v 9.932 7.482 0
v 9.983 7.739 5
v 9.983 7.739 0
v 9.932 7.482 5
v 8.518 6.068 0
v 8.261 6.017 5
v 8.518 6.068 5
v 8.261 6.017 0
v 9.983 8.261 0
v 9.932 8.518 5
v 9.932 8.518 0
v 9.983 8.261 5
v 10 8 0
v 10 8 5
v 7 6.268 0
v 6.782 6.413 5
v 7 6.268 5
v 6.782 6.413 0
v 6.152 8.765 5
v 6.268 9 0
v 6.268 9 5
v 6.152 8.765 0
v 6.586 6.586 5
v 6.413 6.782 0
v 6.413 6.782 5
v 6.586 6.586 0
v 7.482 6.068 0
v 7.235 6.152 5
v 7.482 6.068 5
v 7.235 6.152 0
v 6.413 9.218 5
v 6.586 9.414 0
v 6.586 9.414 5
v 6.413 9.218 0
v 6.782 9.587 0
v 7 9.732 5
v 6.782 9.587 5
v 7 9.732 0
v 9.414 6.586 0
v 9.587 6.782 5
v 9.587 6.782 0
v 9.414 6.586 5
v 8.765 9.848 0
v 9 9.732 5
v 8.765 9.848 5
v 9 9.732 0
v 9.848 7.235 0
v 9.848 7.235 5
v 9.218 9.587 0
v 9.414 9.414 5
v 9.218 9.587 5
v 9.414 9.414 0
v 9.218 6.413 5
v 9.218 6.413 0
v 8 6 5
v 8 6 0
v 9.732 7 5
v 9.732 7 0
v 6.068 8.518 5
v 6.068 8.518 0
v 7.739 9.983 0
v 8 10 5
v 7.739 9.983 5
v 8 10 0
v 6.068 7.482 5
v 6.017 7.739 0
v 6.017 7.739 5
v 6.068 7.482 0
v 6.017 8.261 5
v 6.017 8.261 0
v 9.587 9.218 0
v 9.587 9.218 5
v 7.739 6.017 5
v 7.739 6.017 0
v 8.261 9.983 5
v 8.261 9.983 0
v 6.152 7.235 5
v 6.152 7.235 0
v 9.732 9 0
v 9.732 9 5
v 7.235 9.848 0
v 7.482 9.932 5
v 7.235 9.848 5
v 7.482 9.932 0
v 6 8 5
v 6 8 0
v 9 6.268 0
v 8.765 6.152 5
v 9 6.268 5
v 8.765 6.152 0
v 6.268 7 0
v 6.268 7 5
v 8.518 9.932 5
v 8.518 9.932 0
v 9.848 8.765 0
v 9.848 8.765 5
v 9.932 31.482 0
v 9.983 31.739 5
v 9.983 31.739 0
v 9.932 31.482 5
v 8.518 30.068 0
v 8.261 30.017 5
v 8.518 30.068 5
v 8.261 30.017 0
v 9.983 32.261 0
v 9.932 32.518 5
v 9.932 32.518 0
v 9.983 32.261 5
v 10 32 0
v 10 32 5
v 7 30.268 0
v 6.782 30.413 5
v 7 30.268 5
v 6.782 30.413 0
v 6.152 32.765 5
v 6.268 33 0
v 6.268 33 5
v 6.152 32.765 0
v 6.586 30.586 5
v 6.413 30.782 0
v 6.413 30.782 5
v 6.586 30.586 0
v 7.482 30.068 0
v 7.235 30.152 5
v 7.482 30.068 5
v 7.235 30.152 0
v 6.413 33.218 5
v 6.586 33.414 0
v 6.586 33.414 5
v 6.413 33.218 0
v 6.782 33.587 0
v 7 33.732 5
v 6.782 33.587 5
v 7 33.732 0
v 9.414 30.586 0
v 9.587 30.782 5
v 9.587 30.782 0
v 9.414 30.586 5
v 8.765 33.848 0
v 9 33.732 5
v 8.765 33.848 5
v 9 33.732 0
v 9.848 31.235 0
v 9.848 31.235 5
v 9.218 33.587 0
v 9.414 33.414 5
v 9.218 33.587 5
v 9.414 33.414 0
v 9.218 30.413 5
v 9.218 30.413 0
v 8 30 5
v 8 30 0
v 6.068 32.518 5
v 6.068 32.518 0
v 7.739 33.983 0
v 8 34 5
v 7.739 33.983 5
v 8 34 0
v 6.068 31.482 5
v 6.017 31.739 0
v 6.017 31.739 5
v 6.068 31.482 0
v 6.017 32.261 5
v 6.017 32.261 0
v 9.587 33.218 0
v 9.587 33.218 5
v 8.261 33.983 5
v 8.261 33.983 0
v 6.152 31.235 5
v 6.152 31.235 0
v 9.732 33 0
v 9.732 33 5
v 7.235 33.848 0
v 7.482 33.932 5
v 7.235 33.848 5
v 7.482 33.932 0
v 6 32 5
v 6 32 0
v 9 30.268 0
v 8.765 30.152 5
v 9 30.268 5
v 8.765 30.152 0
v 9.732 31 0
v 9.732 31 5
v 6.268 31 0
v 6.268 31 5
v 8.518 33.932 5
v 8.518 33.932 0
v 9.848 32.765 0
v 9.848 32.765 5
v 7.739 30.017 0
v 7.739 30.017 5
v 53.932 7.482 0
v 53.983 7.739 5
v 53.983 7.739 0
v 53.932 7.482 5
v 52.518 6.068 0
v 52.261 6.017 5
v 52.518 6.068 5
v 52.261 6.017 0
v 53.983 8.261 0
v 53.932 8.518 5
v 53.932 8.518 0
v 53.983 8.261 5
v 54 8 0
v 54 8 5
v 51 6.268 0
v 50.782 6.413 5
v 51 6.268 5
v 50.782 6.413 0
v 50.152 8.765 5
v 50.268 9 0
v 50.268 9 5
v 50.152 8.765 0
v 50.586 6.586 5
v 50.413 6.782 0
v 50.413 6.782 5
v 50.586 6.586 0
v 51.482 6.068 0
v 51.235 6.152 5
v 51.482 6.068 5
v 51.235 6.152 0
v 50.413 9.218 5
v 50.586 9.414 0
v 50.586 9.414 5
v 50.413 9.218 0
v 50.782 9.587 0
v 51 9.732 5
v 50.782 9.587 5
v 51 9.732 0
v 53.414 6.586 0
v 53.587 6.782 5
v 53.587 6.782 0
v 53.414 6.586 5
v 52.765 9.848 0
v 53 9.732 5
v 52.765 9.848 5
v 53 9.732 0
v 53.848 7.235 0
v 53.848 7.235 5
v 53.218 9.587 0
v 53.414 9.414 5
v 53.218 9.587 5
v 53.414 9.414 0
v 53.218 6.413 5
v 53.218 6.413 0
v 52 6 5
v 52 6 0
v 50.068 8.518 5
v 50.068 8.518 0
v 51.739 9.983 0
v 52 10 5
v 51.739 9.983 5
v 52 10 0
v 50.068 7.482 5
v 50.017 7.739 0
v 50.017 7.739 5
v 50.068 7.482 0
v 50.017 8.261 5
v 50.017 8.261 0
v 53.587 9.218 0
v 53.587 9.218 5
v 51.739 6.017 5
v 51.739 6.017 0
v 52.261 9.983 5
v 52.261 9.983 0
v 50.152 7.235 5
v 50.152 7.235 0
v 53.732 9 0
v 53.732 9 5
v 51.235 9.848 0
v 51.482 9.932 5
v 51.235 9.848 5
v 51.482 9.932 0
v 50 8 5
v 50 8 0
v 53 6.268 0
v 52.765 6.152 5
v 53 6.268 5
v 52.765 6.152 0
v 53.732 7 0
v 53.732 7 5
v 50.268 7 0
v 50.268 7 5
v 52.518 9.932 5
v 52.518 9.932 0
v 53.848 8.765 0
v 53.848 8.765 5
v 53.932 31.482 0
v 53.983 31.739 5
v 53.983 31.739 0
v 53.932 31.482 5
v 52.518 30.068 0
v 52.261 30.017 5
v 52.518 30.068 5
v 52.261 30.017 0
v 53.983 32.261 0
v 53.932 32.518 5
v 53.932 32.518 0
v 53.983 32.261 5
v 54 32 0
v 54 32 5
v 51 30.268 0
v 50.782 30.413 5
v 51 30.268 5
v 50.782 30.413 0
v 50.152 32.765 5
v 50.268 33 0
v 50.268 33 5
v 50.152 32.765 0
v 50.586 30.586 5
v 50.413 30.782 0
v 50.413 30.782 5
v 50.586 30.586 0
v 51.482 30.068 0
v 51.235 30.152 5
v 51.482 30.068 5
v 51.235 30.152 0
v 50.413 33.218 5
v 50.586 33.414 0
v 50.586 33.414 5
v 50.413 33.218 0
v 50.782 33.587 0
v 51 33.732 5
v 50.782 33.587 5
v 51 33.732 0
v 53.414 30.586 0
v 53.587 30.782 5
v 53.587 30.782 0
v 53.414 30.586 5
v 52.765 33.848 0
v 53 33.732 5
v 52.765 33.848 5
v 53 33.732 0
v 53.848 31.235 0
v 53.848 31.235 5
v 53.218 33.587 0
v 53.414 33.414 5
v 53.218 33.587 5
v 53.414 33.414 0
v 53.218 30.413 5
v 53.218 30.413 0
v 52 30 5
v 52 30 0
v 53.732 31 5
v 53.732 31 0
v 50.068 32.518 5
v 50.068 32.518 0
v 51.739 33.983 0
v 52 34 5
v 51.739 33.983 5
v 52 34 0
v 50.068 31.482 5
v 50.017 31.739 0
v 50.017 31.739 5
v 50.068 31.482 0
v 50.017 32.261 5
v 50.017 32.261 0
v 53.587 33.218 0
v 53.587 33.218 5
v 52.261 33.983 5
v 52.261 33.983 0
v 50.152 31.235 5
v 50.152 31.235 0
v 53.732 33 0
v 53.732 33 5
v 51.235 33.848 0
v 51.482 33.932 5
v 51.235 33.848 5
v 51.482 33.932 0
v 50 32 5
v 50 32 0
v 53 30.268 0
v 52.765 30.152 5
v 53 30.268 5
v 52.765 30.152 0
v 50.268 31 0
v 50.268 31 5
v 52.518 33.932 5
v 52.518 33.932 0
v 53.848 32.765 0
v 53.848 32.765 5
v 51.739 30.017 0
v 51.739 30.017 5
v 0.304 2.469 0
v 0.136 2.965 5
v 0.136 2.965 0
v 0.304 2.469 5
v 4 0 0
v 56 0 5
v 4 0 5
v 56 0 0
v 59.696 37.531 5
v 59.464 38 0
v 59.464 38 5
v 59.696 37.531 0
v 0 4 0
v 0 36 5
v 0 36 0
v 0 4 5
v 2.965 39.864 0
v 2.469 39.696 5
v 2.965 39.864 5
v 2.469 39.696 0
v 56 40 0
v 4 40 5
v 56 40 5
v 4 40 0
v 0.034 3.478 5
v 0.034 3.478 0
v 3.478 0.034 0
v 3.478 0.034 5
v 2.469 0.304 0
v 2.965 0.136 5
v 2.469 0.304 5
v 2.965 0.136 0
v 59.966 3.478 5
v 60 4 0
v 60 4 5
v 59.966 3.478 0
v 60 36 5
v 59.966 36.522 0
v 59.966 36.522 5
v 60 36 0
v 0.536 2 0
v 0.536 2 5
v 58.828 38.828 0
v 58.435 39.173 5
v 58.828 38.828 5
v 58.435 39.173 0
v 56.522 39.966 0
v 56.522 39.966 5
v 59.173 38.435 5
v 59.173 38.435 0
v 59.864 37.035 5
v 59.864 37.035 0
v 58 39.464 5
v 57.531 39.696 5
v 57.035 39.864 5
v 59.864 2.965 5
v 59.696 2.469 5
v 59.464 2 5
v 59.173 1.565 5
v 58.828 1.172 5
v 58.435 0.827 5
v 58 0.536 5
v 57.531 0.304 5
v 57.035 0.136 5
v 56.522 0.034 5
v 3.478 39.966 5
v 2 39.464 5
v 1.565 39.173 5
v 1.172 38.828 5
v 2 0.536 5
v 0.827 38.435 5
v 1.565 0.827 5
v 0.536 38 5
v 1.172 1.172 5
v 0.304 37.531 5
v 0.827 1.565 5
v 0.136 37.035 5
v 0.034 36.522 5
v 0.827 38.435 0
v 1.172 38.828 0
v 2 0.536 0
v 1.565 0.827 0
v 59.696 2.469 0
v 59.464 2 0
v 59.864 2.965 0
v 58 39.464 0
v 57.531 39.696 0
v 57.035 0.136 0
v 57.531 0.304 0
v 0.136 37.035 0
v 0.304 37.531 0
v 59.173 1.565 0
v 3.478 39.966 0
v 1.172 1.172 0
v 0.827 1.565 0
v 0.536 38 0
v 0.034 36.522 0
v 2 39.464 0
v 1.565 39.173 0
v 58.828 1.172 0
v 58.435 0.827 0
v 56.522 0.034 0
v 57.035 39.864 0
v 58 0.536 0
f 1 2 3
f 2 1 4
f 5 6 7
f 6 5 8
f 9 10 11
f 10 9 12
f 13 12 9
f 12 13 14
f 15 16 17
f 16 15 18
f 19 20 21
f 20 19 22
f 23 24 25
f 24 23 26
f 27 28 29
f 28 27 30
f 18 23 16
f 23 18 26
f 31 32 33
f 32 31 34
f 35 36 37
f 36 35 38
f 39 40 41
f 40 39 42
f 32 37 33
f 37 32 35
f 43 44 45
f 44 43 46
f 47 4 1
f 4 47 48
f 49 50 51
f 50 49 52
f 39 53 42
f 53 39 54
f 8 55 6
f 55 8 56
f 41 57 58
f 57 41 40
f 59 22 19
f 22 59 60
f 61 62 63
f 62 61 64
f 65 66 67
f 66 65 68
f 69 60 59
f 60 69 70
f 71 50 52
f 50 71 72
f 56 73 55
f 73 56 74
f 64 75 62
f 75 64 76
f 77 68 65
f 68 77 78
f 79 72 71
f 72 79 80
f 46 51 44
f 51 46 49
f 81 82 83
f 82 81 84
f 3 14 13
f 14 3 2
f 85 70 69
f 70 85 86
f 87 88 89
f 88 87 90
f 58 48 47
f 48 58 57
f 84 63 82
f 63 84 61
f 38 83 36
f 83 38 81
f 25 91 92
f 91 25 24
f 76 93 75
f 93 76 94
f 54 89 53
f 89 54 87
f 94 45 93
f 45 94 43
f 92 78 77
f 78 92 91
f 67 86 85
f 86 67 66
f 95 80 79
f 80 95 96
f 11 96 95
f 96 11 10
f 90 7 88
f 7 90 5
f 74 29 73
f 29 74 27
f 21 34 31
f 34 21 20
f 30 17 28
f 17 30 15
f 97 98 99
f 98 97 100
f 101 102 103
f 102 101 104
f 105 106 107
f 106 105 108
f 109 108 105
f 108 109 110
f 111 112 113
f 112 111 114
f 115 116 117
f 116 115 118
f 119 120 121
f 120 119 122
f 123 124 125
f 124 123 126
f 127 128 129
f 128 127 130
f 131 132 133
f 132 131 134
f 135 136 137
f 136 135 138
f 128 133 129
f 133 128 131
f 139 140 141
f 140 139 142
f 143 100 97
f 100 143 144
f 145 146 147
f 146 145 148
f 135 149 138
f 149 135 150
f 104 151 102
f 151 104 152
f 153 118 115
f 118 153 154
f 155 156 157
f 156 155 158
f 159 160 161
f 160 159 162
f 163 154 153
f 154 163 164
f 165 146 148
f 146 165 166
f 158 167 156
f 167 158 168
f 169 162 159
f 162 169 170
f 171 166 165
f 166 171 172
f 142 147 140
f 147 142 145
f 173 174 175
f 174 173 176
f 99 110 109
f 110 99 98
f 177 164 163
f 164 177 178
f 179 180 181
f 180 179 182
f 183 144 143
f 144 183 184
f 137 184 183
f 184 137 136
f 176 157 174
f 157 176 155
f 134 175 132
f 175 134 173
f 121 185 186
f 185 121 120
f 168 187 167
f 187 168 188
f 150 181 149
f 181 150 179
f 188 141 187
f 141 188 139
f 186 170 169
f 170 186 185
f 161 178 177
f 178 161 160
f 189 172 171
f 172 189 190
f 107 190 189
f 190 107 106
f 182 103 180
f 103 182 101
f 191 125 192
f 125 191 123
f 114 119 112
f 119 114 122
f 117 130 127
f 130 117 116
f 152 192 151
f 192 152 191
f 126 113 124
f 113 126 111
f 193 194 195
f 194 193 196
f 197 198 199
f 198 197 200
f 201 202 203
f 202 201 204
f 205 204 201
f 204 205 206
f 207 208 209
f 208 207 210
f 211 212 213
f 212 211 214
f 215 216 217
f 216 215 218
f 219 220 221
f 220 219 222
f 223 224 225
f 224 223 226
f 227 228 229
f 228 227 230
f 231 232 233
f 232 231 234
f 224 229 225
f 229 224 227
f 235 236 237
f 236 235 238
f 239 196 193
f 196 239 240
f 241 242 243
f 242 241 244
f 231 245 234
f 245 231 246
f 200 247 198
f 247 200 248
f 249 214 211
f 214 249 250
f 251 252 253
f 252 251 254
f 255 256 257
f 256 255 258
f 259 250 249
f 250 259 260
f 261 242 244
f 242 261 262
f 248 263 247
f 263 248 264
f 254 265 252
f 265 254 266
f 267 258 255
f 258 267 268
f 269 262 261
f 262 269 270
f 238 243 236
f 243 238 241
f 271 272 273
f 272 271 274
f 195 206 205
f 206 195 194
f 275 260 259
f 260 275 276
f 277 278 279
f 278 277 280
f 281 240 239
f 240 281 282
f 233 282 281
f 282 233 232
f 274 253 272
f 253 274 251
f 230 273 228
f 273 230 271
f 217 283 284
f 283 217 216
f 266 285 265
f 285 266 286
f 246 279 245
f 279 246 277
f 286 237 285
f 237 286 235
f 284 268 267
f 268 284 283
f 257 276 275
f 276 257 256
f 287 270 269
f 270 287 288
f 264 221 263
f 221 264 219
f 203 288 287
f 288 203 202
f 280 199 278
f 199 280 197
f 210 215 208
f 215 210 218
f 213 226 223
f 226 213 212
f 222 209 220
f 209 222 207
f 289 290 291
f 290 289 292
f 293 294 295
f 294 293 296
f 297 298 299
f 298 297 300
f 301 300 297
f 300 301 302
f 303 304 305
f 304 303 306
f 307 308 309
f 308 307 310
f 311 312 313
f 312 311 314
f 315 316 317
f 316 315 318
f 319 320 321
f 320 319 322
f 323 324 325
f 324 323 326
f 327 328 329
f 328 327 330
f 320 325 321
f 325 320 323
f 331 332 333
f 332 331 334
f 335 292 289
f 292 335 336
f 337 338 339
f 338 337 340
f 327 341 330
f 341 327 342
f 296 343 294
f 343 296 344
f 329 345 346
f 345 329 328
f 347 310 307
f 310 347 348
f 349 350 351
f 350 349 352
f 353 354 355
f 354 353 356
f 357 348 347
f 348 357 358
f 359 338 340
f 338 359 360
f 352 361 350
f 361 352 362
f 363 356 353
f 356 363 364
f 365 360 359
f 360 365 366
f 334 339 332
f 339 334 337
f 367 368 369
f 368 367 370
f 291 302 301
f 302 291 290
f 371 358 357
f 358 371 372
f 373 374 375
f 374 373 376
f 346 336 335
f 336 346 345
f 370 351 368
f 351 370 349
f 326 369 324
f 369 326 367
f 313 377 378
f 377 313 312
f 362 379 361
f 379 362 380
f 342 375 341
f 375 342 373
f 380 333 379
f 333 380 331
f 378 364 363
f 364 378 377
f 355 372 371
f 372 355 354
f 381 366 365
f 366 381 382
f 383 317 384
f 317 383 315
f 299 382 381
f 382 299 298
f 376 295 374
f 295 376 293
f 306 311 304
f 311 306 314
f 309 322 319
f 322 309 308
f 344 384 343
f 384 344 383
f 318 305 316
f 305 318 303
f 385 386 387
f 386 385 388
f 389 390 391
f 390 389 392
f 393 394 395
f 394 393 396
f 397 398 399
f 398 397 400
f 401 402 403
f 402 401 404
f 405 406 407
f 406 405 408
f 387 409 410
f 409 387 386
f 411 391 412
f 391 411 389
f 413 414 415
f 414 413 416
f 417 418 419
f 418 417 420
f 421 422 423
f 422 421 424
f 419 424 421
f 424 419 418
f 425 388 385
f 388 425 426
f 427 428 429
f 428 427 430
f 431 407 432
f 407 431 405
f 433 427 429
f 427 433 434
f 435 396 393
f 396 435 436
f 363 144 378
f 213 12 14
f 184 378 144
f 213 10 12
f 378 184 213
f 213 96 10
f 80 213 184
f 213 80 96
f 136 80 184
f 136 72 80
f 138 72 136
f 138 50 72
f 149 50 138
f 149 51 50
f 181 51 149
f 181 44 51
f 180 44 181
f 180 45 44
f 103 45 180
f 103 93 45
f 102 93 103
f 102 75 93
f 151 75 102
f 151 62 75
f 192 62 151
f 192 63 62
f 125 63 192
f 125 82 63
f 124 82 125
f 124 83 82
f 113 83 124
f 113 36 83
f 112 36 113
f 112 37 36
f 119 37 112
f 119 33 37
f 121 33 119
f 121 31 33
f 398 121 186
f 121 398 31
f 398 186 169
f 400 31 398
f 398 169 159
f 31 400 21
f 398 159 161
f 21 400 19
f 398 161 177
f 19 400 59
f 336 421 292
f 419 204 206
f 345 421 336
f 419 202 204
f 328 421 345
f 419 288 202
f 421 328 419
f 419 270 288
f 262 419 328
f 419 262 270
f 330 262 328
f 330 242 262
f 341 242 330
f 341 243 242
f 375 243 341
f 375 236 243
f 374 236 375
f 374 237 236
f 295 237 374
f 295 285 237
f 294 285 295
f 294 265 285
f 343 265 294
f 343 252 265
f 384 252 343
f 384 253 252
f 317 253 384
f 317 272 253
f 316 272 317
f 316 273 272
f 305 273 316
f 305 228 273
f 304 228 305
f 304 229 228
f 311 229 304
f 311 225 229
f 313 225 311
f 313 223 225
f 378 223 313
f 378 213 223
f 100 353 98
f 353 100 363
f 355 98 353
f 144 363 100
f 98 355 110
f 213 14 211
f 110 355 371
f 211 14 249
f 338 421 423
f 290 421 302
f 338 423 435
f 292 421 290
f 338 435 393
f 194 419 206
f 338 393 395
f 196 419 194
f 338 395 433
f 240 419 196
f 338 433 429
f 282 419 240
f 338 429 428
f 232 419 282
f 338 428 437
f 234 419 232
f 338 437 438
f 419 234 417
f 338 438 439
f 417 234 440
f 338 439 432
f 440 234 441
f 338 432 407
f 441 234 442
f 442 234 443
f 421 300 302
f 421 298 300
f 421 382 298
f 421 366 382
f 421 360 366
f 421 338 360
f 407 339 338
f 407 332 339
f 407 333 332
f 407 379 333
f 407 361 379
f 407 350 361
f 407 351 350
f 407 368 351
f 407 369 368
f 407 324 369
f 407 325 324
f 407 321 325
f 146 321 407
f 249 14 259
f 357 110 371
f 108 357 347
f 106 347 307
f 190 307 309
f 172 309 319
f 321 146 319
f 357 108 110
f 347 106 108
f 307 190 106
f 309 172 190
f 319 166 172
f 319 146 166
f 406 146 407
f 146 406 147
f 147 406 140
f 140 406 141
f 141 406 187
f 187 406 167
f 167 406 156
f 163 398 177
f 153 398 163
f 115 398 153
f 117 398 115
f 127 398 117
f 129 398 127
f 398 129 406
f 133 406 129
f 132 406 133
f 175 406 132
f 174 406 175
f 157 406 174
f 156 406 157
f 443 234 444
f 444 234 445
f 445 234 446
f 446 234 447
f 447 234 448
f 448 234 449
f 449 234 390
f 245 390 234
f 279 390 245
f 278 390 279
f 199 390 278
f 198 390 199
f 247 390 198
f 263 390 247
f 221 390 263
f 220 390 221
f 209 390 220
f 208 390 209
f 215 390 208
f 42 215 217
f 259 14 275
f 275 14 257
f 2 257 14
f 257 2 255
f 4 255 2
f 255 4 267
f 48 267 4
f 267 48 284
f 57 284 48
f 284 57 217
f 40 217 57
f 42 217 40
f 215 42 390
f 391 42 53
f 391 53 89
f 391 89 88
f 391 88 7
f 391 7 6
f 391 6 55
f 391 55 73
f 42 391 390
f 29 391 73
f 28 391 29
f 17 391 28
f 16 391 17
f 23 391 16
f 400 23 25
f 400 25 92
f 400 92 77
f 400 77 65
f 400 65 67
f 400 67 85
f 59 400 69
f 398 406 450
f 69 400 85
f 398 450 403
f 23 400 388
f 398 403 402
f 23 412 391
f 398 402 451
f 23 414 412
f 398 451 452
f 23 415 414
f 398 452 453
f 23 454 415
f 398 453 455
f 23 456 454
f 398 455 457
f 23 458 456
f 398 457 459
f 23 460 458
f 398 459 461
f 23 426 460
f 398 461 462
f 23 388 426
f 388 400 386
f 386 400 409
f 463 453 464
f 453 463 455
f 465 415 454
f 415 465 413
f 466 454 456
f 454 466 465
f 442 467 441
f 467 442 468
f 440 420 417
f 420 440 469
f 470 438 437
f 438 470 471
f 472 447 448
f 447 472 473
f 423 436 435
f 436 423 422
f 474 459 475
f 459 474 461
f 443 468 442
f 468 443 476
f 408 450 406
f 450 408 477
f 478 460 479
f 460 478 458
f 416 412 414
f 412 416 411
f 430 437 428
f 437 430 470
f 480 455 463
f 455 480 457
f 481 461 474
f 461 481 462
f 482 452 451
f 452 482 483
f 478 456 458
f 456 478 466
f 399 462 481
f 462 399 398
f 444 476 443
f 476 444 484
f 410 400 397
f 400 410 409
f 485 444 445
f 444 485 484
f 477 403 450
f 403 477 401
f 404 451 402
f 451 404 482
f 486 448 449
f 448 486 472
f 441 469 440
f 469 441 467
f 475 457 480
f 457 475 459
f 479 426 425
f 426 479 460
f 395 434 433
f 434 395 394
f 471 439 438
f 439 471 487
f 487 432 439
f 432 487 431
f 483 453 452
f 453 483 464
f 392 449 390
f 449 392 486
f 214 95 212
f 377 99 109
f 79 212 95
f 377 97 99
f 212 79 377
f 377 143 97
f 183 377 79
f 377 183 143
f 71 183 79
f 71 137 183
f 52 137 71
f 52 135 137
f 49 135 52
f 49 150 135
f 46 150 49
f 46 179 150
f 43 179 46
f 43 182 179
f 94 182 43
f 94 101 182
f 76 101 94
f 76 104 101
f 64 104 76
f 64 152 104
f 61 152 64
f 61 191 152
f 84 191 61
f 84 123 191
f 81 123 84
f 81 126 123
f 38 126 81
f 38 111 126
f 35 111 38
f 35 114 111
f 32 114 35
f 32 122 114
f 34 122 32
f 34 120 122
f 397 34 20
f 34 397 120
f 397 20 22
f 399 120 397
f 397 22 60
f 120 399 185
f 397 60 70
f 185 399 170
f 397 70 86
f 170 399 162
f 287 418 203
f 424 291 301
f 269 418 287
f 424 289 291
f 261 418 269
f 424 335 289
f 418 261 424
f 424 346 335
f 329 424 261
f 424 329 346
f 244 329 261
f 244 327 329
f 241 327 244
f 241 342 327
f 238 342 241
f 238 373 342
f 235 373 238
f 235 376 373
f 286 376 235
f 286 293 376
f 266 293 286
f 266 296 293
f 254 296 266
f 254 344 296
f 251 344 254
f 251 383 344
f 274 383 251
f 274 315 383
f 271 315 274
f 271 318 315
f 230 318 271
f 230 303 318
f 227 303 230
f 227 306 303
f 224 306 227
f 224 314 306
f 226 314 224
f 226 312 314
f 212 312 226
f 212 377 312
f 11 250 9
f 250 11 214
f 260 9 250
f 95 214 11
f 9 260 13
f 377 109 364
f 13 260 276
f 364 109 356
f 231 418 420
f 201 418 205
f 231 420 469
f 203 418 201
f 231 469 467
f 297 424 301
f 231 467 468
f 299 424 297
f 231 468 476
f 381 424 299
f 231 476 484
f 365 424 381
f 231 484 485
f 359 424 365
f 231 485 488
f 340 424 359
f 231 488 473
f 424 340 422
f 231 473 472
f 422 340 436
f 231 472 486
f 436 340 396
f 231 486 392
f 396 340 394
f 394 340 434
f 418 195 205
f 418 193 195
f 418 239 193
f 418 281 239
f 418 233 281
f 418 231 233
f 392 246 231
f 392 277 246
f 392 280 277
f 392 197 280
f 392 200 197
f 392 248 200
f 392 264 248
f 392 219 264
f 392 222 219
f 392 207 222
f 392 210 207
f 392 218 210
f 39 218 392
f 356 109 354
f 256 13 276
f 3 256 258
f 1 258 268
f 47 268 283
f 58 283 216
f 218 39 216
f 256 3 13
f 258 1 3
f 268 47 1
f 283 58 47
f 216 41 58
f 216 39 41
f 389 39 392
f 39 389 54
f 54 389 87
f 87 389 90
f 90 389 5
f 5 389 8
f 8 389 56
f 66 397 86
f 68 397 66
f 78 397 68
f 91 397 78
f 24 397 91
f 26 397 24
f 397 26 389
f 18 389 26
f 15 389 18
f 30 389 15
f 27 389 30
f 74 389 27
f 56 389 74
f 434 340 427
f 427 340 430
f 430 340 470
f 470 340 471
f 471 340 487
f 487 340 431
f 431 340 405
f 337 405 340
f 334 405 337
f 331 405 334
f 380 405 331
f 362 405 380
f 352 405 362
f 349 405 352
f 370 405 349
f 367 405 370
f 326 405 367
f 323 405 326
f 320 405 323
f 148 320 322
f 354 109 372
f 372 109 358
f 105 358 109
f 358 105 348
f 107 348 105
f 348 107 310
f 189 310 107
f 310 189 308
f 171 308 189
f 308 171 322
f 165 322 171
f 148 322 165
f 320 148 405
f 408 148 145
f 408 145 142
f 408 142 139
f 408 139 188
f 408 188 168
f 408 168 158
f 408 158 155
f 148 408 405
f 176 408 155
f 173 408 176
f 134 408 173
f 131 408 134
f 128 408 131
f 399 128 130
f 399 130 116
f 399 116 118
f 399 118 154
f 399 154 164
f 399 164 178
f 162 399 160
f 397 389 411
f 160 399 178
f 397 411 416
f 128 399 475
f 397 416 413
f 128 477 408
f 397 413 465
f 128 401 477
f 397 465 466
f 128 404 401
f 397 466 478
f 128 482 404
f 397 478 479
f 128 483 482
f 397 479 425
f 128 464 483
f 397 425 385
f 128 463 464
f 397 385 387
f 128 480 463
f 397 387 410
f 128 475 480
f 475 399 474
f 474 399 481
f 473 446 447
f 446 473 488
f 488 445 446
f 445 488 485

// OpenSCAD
// Uchwyt montażowy — domyślny przykład scadpada.
// Przesuń suwaki po lewej albo zmień kod i kliknij „Renderuj” (Ctrl+Enter).

/* [Płyta] */
width = 60;      // [20:150:5]
depth = 40;      // [20:150:5]
thick = 5;       // [2:15:1]
corner_r = 4;    // [1:15:0.5]

/* [Otwory montażowe] */
hole_d = 4;      // [2:10:0.5]
inset = 8;       // [3:20:1]

module rounded_plate(w, d, t, r) {
  hull() {
    for (x = [r, w - r], y = [r, d - r]) {
      translate([x, y, 0])
        cylinder(h = t, r = r, $fn = 48);
    }
  }
}

difference() {
  rounded_plate(width, depth, thick, corner_r);

  for (x = [inset, width - inset], y = [inset, depth - inset]) {
    translate([x, y, -1])
      cylinder(h = thick + 2, d = hole_d, $fn = 48);
  }
}
